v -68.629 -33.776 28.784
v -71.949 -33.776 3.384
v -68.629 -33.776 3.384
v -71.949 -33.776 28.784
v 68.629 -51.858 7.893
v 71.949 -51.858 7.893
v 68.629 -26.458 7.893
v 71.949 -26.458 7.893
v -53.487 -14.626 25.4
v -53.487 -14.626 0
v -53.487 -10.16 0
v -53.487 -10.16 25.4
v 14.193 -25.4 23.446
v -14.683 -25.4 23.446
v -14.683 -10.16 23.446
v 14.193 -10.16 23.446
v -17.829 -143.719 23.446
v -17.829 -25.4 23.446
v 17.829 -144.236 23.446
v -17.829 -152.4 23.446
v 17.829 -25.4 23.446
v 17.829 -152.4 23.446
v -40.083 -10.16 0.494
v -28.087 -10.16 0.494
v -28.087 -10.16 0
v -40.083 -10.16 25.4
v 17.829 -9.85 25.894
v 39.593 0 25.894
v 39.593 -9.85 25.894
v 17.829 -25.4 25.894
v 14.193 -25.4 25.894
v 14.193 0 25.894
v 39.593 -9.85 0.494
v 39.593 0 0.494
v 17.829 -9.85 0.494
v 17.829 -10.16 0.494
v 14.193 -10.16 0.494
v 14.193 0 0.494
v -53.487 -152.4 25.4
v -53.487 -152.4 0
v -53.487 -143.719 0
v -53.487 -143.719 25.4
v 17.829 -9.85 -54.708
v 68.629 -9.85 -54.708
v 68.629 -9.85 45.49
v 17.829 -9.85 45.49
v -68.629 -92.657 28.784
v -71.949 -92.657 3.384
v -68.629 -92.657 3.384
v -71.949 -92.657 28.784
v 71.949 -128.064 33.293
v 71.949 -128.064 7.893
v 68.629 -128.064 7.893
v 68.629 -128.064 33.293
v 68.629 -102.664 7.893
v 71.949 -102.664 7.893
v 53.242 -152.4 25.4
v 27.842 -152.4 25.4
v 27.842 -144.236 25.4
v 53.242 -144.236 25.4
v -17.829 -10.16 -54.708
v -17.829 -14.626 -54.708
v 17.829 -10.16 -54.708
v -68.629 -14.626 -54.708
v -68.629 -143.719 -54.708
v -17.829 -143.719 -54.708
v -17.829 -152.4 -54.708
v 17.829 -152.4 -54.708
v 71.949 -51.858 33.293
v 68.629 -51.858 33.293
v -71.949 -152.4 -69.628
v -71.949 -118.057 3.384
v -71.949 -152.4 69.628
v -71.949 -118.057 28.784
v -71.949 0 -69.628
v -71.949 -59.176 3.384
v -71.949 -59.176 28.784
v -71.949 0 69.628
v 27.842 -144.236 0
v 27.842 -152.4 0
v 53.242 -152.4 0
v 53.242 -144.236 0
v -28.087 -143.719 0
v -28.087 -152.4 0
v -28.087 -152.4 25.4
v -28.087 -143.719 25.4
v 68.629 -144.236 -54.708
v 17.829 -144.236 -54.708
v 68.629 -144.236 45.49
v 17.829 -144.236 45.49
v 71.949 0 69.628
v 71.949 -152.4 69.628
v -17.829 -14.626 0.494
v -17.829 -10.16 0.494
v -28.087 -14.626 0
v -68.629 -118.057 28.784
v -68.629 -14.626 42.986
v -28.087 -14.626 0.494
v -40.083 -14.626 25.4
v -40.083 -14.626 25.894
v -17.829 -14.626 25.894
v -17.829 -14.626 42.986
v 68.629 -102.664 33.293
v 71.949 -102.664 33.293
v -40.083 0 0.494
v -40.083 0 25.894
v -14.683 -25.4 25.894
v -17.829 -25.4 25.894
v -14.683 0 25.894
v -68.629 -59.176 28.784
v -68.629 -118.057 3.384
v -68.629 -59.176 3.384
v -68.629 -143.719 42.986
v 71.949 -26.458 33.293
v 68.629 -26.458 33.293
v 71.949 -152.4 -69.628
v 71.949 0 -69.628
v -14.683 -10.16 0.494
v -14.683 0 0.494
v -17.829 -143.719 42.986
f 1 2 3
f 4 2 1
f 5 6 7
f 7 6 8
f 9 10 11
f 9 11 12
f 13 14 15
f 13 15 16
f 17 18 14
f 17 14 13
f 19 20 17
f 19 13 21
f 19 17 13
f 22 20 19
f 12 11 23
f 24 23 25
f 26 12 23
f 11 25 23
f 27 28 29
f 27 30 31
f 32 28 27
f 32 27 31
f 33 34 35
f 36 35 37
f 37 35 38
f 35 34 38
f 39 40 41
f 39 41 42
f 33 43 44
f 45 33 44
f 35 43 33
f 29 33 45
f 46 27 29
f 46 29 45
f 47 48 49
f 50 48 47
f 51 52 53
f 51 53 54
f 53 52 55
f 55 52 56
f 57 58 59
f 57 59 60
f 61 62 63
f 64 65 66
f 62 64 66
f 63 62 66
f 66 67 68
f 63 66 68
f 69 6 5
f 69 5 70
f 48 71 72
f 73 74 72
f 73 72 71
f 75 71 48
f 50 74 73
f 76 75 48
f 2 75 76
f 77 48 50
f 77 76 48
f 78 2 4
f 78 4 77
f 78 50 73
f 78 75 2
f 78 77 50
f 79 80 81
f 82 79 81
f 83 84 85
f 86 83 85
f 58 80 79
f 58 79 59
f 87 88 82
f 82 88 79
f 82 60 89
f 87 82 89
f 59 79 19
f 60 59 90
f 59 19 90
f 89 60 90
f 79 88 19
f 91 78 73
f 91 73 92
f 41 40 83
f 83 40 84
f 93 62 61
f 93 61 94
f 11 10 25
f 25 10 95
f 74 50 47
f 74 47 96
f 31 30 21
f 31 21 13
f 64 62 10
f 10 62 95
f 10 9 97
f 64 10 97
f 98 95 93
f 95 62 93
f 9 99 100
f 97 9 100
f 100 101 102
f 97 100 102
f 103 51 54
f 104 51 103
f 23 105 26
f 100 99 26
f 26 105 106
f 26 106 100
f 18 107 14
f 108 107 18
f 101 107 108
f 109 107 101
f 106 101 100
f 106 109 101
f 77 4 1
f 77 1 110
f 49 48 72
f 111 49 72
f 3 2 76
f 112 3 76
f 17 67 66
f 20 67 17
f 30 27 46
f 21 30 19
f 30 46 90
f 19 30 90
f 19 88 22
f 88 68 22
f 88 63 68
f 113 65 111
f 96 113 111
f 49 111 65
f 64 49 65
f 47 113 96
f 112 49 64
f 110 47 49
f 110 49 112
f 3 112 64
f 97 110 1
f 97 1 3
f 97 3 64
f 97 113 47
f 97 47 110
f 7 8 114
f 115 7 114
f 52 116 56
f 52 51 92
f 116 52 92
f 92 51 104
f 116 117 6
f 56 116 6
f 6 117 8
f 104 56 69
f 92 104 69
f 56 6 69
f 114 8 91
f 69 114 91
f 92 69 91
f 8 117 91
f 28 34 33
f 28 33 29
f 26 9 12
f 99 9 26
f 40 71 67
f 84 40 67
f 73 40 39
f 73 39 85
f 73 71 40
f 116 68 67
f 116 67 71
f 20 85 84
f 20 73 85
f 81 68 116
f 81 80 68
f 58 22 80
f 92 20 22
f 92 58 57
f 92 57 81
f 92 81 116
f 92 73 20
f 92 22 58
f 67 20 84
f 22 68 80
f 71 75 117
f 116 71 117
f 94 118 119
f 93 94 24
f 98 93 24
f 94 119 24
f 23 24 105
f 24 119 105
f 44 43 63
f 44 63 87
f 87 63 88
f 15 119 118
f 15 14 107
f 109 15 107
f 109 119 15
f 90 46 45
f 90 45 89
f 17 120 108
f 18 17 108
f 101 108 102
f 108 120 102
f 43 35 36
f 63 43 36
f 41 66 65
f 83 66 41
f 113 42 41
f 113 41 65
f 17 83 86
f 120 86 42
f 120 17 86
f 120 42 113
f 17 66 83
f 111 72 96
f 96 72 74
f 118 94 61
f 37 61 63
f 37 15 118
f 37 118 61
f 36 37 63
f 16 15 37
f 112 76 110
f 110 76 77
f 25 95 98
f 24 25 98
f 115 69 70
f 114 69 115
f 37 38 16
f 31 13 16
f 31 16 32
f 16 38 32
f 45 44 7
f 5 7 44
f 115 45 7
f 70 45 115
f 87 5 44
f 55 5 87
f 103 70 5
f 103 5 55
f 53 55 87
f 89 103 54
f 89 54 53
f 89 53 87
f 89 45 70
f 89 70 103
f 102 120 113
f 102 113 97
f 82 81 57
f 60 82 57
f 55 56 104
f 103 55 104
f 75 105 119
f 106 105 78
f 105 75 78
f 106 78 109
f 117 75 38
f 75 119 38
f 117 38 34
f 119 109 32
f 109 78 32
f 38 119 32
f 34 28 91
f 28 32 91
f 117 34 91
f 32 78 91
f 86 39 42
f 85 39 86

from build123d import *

# Parameters (mm, degrees)
F0_W      = 143.89868
F0_H      = 139.25679
F1_DEPTH  = 152.4
F2_W      = 25.4
F2_H      = 25.4
F2_W_2    = 35.657714
F2_H_2    = 78.153904
F3_DEPTH  = 142.24
F4_W      = 129.092633
F4_H      = 89.404348
F5_DEPTH  = 50.8
F6_W      = 134.386524
F6_H      = 100.197379
F7_DEPTH  = 50.8
F8_W      = 129.092633
F8_H      = 8.289584
F9_DEPTH  = 50.8
F10_W     = 25.4
F10_H     = 25.4
F11_DEPTH = 25.4
F12_W     = 25.4
F12_H     = 25.4
F13_DEPTH = 50.8
F14_W     = 25.399997
F14_H     = 25.4
F14_W_2   = 25.4
F15_DEPTH = 25.4


with BuildPart() as f1:
    # F0 (on Front) → F1 (new body)
    with BuildSketch(Plane.XZ):
        Rectangle(F0_W, F0_H)
    extrude(amount=F1_DEPTH)

    # F2 (on face) → F3 (cut)
    with BuildSketch(Plane.XZ.offset(152.4)):
        with Locations((-40.786578, 12.7)):
            Rectangle(F2_W, F2_H)
        with Locations((40.542332, 12.7)):
            Rectangle(F2_W, F2_H)
        with Locations((0, -15.630781)):
            Rectangle(F2_W_2, F2_H_2)
    extrude(amount=-F3_DEPTH, mode=Mode.SUBTRACT)

    # F4 (on face) → F5 (cut)
    with BuildSketch(Plane.YZ.offset(-17.828857)):
        with Locations((-79.17279, -1.715975)):
            Rectangle(F4_W, F4_H)
    extrude(amount=-F5_DEPTH, mode=Mode.SUBTRACT)

    # F6 (on face) → F7 (cut)
    with BuildSketch(Plane(origin=(17.828857, 0, 0), x_dir=(0, -1, 0), z_dir=(-1, 0, 0))):
        with Locations((77.042945, -4.609043)):
            Rectangle(F6_W, F6_H)
    extrude(amount=-F7_DEPTH, mode=Mode.SUBTRACT)

    # F8 (on face) → F9 (cut)
    with BuildSketch(Plane.YZ.offset(-17.828857)):
        with Locations((-79.17279, -50.562941)):
            Rectangle(F8_W, F8_H)
    extrude(amount=-F9_DEPTH, mode=Mode.SUBTRACT)

    # F10 (on face) → F11 (cut)
    with BuildSketch(Plane.YZ.offset(71.94934)):
        with Locations((-115.364381, 20.59305)):
            Rectangle(F10_W, F10_H)
        with Locations((-39.158143, 20.59305)):
            Rectangle(F10_W, F10_H)
    extrude(amount=-F11_DEPTH, mode=Mode.SUBTRACT)

    # F12 (on face) → F13 (cut)
    with BuildSketch(Plane(origin=(-71.94934, 0, 0), x_dir=(0, -1, 0), z_dir=(-1, 0, 0))):
        with Locations((46.475742, 16.083911)):
            Rectangle(F12_W, F12_H)
        with Locations((105.357133, 16.083911)):
            Rectangle(F12_W, F12_H)
    extrude(amount=-F13_DEPTH, mode=Mode.SUBTRACT)

    # F14 (on face) → F15 (cut)
    with BuildSketch(Plane(origin=(0, 0, 0), x_dir=(-1, 0, 0), z_dir=(0, 1, 0))):
        with Locations((-26.893279, 13.194072)):
            Rectangle(F14_W, F14_H)
        with Locations((27.382654, 13.194072)):
            Rectangle(F14_W_2, F14_H)
    extrude(amount=-F15_DEPTH, mode=Mode.SUBTRACT)


solid = f1.part
